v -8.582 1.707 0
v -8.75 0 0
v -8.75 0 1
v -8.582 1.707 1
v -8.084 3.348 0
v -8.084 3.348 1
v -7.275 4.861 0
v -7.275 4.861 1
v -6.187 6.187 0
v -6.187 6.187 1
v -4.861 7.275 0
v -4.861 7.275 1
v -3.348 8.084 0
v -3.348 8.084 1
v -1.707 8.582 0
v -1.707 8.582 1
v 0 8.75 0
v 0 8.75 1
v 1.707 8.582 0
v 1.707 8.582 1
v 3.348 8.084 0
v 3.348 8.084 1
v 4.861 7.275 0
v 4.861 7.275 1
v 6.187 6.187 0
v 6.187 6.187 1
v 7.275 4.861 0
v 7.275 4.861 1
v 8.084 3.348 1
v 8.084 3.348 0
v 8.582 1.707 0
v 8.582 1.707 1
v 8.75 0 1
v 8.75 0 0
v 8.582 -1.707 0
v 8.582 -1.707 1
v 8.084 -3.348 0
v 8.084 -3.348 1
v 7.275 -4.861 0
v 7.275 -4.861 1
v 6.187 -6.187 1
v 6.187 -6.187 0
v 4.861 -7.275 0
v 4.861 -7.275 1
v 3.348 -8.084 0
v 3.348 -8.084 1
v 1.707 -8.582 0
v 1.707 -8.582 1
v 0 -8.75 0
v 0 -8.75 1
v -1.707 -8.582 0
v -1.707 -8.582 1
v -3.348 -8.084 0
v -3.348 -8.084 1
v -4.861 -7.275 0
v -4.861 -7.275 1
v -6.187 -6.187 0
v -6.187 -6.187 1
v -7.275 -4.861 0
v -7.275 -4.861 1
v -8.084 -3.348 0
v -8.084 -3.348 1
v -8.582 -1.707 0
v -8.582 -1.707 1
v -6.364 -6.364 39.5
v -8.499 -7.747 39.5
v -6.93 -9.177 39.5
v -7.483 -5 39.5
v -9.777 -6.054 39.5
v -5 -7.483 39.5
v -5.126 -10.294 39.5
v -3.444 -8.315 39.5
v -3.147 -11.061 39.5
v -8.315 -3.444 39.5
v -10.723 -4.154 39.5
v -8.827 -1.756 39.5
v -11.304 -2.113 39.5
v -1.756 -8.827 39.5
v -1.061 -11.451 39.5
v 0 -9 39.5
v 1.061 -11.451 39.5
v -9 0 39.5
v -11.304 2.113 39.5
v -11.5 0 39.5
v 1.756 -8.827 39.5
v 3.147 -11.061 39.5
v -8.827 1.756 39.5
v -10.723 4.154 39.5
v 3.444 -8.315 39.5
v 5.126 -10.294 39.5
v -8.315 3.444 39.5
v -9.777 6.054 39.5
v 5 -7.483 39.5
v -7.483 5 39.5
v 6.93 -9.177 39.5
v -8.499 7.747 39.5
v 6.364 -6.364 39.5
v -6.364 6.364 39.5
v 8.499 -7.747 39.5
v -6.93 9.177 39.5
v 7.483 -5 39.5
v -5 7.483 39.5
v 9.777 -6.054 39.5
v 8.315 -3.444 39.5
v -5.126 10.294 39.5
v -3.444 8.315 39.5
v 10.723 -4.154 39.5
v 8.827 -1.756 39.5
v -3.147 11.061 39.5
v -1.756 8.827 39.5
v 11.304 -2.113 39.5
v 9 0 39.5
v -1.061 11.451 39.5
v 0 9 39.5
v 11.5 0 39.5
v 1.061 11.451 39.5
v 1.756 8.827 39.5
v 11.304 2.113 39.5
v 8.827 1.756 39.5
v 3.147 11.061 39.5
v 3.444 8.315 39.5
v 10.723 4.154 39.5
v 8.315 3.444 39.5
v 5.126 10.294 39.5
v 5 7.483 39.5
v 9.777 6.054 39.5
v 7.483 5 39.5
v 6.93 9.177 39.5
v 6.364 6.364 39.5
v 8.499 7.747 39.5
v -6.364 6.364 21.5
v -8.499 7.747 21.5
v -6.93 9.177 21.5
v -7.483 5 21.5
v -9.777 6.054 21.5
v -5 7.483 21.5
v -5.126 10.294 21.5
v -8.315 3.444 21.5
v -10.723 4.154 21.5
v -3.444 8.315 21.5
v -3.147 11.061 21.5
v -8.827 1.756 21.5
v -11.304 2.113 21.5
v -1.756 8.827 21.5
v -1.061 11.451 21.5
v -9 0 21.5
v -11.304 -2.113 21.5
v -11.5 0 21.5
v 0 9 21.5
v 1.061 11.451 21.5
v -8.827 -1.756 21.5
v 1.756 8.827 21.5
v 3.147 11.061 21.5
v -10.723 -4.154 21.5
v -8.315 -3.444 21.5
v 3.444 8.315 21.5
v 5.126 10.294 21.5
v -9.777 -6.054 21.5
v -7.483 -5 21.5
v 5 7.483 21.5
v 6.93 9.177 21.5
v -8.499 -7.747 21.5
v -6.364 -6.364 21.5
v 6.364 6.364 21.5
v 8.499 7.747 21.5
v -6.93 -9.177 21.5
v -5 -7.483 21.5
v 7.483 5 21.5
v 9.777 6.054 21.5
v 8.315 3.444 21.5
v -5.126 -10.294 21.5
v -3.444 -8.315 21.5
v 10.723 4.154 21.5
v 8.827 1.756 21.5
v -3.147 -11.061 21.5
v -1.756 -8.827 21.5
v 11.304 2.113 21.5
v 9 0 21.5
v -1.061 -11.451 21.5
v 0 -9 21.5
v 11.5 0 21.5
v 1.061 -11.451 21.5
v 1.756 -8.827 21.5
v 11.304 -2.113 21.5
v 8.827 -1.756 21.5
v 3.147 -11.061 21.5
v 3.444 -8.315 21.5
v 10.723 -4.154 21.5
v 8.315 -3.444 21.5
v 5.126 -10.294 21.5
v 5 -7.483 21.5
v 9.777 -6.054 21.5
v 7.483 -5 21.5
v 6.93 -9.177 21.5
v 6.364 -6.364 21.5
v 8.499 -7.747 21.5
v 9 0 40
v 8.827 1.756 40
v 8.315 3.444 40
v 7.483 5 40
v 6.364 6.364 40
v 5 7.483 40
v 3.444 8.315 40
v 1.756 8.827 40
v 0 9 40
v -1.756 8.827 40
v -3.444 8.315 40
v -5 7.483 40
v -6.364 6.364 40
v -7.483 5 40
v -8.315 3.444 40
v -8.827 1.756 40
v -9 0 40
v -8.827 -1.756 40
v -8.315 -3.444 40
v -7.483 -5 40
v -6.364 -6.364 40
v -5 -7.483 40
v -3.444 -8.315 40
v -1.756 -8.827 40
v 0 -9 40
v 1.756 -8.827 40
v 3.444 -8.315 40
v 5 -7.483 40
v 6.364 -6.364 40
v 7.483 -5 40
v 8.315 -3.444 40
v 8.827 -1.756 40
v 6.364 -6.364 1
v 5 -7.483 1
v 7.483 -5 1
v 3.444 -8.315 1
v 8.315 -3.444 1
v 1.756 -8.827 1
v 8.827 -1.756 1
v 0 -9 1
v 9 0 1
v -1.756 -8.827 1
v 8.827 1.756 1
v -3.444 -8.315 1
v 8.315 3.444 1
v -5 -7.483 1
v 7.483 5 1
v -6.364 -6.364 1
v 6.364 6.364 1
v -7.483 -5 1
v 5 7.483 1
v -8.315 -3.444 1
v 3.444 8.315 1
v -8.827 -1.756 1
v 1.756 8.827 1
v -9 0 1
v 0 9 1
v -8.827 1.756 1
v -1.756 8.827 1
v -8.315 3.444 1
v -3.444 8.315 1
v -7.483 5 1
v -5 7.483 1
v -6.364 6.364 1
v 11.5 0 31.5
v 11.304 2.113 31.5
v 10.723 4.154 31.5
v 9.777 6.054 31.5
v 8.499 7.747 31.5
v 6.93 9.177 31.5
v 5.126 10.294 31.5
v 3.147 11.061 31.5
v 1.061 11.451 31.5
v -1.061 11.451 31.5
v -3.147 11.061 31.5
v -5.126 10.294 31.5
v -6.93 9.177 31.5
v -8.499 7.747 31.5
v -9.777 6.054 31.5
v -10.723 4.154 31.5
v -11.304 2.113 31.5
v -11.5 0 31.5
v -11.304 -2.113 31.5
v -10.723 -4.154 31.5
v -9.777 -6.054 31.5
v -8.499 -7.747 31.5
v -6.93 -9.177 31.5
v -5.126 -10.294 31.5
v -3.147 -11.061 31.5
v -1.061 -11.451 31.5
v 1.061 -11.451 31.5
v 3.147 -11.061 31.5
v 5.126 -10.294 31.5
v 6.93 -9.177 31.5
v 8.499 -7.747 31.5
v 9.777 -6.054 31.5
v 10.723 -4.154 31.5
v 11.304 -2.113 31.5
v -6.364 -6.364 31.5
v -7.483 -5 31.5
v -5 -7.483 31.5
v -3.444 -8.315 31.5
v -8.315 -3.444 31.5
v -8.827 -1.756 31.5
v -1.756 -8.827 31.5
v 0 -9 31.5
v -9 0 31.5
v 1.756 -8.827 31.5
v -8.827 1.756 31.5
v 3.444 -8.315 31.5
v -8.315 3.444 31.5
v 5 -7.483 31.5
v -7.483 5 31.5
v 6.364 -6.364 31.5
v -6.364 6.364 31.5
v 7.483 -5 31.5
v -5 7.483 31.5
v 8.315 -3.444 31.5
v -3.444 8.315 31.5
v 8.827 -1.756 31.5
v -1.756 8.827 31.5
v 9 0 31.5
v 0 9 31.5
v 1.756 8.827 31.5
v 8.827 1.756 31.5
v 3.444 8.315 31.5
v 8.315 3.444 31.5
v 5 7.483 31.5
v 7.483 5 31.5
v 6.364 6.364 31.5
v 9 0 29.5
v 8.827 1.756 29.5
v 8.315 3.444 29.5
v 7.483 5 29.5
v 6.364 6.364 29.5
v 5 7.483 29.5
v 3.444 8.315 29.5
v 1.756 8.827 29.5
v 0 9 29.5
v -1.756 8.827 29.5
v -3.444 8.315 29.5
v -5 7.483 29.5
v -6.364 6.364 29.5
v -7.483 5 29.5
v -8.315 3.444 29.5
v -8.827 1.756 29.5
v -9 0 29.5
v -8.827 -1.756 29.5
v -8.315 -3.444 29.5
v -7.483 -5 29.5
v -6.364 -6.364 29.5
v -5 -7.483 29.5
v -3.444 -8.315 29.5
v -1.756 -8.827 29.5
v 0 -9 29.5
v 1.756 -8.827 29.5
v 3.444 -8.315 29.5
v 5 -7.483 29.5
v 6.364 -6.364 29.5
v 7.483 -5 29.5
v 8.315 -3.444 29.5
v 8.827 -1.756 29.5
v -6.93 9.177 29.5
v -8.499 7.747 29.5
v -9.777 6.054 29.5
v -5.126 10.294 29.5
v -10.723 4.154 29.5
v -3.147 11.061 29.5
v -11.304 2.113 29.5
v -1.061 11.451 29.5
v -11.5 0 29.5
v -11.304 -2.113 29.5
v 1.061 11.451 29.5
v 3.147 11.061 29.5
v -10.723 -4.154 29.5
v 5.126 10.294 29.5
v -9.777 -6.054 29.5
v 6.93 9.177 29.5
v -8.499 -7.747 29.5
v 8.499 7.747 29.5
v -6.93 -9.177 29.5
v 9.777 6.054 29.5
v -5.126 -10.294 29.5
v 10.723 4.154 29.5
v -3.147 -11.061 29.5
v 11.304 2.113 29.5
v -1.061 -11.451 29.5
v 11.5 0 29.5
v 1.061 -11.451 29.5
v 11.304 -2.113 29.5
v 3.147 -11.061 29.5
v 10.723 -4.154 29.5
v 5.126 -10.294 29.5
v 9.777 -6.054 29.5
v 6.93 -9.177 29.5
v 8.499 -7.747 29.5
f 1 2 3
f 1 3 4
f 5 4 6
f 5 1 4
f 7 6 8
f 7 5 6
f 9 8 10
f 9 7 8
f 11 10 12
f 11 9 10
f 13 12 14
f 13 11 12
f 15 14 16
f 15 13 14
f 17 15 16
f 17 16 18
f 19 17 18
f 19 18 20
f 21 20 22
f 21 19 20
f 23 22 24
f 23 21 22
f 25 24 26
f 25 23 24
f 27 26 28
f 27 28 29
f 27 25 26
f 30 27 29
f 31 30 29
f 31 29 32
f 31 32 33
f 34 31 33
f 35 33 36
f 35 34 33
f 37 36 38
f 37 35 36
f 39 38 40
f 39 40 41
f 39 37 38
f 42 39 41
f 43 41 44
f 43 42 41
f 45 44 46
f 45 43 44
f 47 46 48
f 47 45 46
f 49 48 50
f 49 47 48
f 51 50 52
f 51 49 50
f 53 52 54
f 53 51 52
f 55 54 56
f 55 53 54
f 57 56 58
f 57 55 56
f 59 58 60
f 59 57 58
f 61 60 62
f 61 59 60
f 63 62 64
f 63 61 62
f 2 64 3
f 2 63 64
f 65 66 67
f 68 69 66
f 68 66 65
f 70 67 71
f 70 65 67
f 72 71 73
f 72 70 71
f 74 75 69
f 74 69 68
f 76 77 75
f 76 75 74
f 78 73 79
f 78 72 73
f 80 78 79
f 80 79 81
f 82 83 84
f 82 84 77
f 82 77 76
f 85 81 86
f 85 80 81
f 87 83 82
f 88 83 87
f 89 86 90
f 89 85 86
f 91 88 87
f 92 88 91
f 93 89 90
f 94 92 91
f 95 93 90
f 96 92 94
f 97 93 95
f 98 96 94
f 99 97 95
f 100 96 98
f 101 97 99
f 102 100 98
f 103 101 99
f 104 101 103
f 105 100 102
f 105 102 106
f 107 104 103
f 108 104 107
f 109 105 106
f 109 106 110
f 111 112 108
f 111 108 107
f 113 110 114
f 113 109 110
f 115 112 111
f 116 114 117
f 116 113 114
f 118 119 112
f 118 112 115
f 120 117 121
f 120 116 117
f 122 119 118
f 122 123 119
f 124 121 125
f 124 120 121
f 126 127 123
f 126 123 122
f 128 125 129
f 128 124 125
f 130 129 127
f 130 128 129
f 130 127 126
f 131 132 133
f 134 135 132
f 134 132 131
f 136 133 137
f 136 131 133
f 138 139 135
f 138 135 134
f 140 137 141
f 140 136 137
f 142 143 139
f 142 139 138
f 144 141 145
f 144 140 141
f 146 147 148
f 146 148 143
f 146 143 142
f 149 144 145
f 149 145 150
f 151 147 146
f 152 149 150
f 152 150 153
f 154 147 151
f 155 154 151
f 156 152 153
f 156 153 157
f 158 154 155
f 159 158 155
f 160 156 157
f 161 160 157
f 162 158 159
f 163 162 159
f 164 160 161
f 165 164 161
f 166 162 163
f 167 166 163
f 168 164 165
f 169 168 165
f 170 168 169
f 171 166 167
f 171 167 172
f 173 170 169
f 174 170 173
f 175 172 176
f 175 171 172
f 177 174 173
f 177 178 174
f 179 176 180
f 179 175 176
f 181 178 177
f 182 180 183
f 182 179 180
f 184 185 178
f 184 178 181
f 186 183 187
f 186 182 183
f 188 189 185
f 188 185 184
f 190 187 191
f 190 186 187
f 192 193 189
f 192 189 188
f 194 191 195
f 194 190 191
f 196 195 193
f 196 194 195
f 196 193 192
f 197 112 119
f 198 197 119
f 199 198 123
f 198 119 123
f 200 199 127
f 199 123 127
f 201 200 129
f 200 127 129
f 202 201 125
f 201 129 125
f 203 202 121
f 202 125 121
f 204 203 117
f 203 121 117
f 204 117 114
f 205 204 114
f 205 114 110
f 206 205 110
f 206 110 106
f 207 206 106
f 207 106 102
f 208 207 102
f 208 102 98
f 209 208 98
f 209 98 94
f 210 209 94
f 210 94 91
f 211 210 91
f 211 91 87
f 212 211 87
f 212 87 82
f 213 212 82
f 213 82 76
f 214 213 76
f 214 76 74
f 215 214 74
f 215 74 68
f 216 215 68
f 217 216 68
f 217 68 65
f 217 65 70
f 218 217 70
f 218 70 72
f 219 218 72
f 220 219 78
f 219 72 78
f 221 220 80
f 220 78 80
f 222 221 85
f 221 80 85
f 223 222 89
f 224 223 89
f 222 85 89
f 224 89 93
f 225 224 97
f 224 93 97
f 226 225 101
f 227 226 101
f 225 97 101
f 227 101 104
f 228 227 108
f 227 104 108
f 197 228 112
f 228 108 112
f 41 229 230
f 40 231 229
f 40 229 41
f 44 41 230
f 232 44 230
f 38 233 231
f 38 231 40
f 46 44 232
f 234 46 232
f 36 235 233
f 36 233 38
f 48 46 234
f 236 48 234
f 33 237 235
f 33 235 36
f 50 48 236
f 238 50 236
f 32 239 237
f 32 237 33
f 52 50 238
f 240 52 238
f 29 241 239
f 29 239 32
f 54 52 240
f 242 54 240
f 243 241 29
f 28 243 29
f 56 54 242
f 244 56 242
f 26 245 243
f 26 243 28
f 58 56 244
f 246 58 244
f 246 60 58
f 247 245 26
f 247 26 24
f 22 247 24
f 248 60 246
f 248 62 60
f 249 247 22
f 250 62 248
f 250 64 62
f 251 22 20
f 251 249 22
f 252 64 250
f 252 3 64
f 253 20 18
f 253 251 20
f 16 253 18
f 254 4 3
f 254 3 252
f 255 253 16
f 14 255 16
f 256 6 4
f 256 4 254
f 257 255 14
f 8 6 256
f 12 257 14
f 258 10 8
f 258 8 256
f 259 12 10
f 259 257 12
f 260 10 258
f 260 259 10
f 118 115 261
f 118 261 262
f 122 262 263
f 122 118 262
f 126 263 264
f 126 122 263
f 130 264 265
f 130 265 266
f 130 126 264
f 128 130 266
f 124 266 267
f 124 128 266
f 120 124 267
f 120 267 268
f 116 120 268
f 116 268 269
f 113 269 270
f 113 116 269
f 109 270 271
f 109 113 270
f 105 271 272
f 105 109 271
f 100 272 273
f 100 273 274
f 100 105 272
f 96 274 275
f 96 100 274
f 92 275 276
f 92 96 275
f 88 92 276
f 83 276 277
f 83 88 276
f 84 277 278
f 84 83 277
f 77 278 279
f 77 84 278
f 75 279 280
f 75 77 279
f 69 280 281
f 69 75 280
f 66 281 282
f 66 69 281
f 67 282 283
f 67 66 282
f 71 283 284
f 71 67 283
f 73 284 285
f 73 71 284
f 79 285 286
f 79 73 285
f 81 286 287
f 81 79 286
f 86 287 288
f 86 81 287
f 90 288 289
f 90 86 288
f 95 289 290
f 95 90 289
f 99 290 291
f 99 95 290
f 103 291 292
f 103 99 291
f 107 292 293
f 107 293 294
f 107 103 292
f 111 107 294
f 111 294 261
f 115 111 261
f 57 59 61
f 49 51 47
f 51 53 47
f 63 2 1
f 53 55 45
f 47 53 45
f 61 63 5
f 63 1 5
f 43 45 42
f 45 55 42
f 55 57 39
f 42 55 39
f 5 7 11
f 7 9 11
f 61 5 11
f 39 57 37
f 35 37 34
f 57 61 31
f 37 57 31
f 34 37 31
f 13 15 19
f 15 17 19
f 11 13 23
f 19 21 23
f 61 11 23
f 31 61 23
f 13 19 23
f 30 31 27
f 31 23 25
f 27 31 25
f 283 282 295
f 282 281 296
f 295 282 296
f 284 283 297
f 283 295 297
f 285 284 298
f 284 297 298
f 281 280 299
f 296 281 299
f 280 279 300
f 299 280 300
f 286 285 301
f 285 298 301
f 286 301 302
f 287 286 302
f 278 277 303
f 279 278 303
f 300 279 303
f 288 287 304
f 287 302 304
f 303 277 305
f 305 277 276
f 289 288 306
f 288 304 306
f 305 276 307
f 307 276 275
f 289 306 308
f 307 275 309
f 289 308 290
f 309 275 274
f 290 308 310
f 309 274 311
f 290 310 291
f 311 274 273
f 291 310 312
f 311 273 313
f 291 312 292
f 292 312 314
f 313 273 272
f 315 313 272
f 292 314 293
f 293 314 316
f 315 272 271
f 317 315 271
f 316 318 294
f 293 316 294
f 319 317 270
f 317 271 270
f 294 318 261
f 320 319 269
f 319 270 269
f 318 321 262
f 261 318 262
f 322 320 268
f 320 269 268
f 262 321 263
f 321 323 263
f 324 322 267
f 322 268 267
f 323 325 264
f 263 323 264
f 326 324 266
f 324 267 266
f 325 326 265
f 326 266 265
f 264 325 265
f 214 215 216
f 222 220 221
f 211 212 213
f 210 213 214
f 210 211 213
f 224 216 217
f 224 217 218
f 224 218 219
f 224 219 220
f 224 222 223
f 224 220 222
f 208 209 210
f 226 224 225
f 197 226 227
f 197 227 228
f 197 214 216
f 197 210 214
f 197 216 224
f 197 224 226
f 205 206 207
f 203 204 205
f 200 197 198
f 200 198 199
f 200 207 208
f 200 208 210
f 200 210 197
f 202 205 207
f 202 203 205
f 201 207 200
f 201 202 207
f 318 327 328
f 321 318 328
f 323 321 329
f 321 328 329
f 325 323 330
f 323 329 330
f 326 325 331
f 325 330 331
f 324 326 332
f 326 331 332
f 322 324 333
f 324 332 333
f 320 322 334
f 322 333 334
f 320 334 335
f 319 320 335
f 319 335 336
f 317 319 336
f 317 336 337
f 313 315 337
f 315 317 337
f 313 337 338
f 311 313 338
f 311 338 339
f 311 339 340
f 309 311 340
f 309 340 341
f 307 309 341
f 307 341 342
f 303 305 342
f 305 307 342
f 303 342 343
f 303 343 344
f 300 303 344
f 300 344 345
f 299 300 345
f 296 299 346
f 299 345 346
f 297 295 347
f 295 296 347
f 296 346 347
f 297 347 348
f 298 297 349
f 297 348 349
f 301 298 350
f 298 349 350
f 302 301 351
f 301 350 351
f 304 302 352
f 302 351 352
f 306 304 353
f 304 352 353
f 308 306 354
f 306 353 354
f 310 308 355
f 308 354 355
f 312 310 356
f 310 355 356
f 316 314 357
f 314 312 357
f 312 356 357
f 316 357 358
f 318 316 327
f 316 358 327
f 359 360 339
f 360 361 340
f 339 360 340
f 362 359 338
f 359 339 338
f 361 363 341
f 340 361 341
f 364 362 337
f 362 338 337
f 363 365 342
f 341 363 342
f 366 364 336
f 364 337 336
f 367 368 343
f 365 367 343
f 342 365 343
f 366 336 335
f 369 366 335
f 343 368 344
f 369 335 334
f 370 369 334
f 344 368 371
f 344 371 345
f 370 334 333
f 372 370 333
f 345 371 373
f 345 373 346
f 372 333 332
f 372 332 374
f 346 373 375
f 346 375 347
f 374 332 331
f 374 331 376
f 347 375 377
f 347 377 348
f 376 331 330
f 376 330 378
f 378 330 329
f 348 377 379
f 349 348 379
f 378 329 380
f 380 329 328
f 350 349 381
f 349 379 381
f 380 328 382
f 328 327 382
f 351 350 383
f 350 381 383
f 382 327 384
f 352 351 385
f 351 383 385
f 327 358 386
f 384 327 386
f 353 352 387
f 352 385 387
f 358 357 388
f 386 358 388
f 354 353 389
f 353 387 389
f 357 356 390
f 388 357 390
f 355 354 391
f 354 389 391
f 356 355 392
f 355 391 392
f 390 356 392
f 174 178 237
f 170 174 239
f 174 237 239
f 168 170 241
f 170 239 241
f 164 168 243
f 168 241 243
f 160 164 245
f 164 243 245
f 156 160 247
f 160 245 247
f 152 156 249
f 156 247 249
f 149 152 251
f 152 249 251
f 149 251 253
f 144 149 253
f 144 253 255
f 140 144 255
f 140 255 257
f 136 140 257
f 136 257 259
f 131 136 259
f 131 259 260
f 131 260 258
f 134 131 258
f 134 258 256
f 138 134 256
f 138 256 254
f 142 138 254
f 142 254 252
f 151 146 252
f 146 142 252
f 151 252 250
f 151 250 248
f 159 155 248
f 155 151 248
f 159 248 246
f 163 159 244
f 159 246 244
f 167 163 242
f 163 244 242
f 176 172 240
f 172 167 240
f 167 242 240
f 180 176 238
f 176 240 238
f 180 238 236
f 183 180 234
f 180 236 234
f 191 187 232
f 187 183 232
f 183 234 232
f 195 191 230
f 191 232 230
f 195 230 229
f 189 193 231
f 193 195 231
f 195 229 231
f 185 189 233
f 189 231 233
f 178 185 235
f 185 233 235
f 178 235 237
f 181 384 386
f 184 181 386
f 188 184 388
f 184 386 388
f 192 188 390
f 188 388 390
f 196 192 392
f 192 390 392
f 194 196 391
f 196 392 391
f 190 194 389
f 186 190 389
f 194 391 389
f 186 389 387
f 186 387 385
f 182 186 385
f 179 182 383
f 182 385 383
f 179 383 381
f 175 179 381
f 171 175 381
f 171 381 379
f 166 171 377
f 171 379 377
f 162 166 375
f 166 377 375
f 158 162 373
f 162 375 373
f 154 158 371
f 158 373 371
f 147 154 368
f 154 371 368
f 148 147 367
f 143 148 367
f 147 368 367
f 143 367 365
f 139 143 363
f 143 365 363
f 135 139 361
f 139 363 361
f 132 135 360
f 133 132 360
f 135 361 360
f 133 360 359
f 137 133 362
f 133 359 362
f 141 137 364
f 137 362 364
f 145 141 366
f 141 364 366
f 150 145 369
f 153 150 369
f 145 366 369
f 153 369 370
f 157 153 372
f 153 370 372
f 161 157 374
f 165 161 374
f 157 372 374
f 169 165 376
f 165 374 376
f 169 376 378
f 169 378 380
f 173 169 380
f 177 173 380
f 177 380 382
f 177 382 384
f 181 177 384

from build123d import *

# Parameters (mm, degrees)
SKETCH1_R           = 9
BOSS_EXTRUDE1_DEPTH = 40
BOSS_EXTRUDE5_START = -0.5
SKETCH4_R           = 11.5
BOSS_EXTRUDE5_DEPTH = 8
BOSS_EXTRUDE6_START = 2
SKETCH5_R           = 11.5
BOSS_EXTRUDE6_DEPTH = 8
SKETCH6_R           = 9
SKETCH6_R_2         = 8.75
CUT_EXTRUDE1_DEPTH  = 1


with BuildPart() as part:
    # Sketch1 → Boss-Extrude1 (new body)
    with BuildSketch(Plane.XY):
        Circle(SKETCH1_R)
    extrude(amount=BOSS_EXTRUDE1_DEPTH)

    # Sketch4 → Boss-Extrude5 (add)
    with BuildSketch(Plane.XY.offset(40).offset(BOSS_EXTRUDE5_START)):
        Circle(SKETCH4_R)
    extrude(amount=-BOSS_EXTRUDE5_DEPTH)

    # Sketch5 → Boss-Extrude6 (add)
    with BuildSketch(Plane(origin=(0, 0, 31.5), x_dir=(-1, 0, 0), z_dir=(0, 0, -1)).offset(BOSS_EXTRUDE6_START)):
        with Locations(Location((0, 0, 0), (0, 0, 180))):
            Circle(SKETCH5_R)
    extrude(amount=BOSS_EXTRUDE6_DEPTH)

    # Sketch6 → Cut-Extrude1 (cut)
    with BuildSketch(Plane(origin=(0, 0, 0), x_dir=(-1, 0, 0), z_dir=(0, 0, -1))):
        Circle(SKETCH6_R)
        Circle(SKETCH6_R_2, mode=Mode.SUBTRACT)
    extrude(amount=-CUT_EXTRUDE1_DEPTH, mode=Mode.SUBTRACT)


solid = part.part
